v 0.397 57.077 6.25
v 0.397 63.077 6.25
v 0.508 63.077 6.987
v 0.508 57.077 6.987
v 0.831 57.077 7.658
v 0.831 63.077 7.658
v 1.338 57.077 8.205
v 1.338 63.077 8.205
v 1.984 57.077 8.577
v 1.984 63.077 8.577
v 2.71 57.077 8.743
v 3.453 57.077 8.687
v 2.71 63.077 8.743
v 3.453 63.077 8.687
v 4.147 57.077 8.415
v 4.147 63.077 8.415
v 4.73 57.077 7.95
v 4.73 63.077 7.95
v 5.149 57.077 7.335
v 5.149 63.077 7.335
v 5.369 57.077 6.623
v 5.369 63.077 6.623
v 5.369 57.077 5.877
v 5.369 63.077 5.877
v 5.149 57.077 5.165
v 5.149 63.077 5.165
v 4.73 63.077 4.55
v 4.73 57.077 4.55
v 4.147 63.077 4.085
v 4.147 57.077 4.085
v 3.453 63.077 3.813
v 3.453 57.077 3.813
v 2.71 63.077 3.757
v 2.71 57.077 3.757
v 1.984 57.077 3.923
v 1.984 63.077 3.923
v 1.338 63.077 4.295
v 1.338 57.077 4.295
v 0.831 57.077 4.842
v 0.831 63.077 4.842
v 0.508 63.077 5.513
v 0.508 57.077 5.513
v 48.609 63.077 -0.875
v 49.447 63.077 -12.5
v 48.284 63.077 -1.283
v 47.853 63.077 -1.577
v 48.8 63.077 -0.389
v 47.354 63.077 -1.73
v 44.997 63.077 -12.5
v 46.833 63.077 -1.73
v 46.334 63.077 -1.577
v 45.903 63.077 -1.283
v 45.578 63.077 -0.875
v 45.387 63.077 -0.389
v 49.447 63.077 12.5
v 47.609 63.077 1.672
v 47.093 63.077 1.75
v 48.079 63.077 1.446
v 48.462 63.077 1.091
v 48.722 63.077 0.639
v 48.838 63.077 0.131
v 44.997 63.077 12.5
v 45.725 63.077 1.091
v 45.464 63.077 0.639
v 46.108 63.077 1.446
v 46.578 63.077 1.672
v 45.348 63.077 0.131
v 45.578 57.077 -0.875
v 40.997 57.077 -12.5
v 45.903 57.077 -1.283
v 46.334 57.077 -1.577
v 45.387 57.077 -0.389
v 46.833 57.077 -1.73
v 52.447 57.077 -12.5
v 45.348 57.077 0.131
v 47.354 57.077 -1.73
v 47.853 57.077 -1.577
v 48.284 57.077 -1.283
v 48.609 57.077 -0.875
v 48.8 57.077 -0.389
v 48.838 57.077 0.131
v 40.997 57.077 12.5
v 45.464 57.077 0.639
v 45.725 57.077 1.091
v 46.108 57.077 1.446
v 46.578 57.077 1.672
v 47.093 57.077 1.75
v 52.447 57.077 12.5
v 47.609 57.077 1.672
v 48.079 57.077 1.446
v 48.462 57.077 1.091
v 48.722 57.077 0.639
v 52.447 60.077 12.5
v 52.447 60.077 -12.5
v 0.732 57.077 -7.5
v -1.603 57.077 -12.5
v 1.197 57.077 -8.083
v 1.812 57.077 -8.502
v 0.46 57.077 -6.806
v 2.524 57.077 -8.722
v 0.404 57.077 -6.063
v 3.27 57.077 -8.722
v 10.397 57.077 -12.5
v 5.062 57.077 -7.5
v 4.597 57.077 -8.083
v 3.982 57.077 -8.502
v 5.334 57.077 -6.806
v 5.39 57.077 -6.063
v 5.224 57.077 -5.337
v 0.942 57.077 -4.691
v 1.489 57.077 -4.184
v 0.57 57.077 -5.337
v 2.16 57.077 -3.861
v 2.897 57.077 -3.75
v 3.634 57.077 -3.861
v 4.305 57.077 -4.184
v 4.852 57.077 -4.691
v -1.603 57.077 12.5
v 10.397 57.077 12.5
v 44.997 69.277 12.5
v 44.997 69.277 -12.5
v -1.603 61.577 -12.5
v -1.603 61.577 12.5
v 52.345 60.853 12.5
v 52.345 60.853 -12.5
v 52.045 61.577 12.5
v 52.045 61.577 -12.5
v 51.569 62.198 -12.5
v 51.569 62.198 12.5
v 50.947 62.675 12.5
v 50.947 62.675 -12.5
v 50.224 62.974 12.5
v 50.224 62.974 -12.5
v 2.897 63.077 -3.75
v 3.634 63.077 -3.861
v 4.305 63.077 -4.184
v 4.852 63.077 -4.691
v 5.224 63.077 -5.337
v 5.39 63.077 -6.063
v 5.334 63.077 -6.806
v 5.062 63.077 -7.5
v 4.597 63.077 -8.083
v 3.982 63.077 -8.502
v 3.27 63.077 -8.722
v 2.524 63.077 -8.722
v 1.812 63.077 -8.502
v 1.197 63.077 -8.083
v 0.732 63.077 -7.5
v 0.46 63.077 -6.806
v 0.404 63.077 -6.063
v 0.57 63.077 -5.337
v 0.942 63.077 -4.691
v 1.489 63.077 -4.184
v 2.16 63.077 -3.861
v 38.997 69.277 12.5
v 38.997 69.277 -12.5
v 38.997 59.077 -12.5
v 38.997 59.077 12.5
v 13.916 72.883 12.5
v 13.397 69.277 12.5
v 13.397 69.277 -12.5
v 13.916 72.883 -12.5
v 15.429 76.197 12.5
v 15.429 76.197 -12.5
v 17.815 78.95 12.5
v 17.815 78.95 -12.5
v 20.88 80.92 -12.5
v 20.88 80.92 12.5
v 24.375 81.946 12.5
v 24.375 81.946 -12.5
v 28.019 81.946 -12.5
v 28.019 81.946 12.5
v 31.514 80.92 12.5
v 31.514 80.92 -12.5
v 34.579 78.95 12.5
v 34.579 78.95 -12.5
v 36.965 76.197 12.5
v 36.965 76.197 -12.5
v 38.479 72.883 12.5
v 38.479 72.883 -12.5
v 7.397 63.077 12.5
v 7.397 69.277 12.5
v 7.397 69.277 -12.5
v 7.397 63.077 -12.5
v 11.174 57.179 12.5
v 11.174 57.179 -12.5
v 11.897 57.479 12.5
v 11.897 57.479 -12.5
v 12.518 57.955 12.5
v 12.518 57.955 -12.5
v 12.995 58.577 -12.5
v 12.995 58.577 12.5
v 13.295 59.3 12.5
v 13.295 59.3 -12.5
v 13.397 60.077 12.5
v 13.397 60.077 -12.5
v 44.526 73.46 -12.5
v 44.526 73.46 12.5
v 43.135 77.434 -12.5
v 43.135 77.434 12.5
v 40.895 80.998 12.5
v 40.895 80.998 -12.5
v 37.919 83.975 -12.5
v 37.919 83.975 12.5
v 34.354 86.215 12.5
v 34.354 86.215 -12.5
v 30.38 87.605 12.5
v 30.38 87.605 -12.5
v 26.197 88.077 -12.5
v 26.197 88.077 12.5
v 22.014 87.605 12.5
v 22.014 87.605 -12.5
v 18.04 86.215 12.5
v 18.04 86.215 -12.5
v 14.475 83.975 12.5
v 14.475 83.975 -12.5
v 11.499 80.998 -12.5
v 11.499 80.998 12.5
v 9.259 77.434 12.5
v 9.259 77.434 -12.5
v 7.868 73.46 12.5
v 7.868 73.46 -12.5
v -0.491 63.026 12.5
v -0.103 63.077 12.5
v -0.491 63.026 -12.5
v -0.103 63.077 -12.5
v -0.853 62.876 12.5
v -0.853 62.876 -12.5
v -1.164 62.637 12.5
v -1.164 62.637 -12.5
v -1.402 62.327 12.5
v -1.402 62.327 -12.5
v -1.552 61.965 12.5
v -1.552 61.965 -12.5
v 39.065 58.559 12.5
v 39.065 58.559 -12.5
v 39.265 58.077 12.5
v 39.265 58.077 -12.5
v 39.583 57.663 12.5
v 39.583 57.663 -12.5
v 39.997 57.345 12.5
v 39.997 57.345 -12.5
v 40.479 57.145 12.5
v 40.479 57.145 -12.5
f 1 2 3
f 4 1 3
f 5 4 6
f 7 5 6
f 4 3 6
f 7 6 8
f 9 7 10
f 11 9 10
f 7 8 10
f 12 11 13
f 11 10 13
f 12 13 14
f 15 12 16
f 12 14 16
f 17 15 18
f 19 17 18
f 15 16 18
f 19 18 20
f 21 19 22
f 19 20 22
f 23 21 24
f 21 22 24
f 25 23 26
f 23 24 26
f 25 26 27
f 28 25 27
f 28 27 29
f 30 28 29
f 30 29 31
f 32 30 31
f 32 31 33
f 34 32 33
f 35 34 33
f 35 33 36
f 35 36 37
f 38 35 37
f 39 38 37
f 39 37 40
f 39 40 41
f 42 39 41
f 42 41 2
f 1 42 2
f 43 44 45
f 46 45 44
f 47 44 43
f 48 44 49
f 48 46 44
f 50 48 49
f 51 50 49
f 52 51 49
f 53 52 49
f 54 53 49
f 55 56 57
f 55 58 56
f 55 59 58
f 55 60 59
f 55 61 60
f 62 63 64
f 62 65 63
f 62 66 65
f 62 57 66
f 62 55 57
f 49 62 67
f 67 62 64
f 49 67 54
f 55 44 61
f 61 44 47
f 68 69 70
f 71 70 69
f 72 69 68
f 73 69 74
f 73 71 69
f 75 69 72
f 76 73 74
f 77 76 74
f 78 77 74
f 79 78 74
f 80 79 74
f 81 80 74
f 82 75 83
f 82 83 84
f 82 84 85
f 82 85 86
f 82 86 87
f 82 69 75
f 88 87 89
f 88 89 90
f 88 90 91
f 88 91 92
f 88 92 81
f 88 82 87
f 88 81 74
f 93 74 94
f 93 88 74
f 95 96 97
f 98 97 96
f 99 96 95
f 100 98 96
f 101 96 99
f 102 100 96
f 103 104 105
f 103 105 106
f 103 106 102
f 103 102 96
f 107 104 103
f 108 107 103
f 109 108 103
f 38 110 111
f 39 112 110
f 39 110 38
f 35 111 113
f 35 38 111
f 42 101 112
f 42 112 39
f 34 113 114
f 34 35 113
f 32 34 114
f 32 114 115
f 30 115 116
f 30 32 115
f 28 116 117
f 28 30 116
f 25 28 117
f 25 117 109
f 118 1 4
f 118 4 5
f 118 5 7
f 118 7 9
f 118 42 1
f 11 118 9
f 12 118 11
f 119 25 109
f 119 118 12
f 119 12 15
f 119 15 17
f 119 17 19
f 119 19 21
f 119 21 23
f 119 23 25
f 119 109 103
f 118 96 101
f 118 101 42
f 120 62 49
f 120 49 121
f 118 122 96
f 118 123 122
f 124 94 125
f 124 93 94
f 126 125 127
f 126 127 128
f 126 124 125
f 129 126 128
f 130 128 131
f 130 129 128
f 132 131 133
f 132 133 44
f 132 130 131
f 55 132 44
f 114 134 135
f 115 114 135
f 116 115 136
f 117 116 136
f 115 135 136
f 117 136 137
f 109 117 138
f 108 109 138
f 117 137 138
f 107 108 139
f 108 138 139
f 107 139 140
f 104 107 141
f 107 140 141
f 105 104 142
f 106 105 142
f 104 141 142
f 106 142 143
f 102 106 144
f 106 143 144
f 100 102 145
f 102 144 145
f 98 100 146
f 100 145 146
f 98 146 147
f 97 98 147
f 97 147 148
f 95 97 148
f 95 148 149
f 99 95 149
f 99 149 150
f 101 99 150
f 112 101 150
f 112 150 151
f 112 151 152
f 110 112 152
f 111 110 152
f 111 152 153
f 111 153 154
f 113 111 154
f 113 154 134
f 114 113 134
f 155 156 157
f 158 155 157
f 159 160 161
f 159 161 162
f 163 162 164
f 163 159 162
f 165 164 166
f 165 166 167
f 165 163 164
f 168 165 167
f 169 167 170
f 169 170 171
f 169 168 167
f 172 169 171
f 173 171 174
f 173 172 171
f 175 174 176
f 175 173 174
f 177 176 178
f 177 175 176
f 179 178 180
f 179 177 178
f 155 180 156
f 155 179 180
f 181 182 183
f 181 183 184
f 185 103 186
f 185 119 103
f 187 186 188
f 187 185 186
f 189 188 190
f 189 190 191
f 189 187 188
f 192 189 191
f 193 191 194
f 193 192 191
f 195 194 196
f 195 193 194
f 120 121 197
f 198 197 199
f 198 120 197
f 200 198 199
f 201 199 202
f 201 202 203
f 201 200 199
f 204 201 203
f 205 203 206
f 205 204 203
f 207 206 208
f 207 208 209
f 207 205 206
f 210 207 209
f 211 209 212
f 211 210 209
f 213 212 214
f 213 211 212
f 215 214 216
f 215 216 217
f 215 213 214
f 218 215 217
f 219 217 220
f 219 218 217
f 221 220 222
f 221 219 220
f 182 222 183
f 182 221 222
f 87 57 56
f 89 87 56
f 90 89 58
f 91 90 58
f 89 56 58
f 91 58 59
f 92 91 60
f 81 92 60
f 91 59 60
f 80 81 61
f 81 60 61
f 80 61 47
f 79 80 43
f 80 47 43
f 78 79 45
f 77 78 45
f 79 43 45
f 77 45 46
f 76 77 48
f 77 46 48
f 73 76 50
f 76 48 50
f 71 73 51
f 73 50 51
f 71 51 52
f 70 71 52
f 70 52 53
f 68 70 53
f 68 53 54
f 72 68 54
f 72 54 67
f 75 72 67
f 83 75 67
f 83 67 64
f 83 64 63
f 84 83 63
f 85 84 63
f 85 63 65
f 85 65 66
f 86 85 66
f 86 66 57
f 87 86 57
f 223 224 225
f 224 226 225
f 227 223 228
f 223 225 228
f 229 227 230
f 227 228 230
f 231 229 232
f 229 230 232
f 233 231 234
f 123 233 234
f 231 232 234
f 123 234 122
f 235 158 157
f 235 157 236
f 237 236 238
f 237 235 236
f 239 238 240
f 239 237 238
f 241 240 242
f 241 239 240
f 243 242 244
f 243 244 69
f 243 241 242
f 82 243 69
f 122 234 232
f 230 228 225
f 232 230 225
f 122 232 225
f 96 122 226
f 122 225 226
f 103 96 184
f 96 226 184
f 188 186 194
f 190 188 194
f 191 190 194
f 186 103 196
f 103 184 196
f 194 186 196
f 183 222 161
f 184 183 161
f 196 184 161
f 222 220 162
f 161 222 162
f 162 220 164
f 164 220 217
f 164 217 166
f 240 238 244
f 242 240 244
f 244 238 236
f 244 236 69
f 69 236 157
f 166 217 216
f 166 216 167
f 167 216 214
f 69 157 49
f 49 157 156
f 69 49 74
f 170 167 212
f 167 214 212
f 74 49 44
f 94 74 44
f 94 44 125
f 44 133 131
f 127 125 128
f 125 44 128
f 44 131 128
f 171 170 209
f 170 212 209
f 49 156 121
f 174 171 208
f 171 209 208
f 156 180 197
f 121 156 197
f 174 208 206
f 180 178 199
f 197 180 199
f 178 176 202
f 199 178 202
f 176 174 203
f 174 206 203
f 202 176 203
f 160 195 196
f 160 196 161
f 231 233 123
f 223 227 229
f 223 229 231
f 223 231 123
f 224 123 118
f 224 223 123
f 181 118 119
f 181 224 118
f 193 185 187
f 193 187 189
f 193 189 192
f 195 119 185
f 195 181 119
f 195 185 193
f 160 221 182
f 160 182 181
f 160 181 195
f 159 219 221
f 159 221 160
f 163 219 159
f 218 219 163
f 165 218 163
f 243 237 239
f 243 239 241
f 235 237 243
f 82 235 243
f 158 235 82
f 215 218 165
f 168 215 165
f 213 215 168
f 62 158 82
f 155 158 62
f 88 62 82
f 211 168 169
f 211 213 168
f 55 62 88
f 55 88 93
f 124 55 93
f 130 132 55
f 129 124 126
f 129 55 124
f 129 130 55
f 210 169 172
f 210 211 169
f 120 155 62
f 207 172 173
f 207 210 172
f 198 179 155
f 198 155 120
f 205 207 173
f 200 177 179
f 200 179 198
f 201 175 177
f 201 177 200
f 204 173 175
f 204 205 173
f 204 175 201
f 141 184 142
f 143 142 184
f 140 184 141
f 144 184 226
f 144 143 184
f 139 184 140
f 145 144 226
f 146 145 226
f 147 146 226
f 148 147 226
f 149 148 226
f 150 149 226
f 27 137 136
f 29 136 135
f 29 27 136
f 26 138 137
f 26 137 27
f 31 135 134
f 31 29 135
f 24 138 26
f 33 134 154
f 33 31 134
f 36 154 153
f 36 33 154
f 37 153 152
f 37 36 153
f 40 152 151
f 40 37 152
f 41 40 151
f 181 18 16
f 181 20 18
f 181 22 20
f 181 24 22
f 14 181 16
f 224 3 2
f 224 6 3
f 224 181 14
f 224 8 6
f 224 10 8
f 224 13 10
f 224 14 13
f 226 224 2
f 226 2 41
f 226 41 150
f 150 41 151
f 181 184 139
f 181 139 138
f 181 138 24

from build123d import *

# Parameters (mm, degrees)
BOSS_EXTRU_1_DEPTH      = 12.5
ESQUISSE2_R             = 2.5
ESQUISSE2_R_2           = 1.75
ENL_V_MAT_EXTRU_1_DEPTH = 10
CONG_4_R                = 3
CONG_5_R                = 1.5


with BuildPart() as part:
    # Esquisse1 → Boss.-Extru.1 (new, symmetric)
    with BuildSketch(Plane.XY):
        with BuildLine():
            Line((0.397051683, 57.076719782), (10.397051683, 57.076719782))
            ThreePointArc((10.397051683, 57.076719782), (12.518372027, 57.955399438), (13.397051683, 60.076719782))
            Line((13.397051683, 60.076719782), (13.397051683, 69.276719782))
            ThreePointArc((13.397051683, 69.276719782), (26.197051683, 82.076719782), (38.997051683, 69.276719782))
            Line((38.997051683, 69.276719782), (38.997051683, 59.076719782))
            ThreePointArc((38.997051683, 59.076719782), (39.582838121, 57.662506219), (40.997051683, 57.076719782))
            Line((40.997051683, 57.076719782), (49.420552909, 57.076719782))
            Line((49.420552909, 57.076719782), (52.447260314, 57.076719782))
            Line((52.447260314, 57.076719782), (52.447260314, 63.076719782))
            Line((52.447260314, 63.076719782), (49.420552909, 63.076719782))
            Line((49.420552909, 63.076719782), (44.997051683, 63.076719782))
            Line((44.997051683, 63.076719782), (44.997051683, 69.276719782))
            ThreePointArc((44.997051683, 69.276719782), (26.197051683, 88.076719782), (7.397051683, 69.276719782))
            Line((7.397051683, 69.276719782), (7.397051683, 63.076719782))
            Line((7.397051683, 63.076719782), (0.397051683, 63.076719782))
            Line((0.397051683, 63.076719782), (-1.602948317, 63.076719782))
            Line((-1.602948317, 63.076719782), (-1.602948317, 57.076719782))
            Line((-1.602948317, 57.076719782), (0.397051683, 57.076719782))
        make_face()
    extrude(amount=BOSS_EXTRU_1_DEPTH, both=True)

    # Esquisse2 → Enlèv. mat.-Extru.1 (cut)
    with BuildSketch(Plane(origin=(0, 63.076719782, 0), x_dir=(1, 0, 0), z_dir=(0, 1, 0))):
        with Locations(Location((2.897051683, 6.25, 0), (0, 0, 270))):
            Circle(ESQUISSE2_R)
        with Locations(Location((2.897051683, -6.25, 0), (0, 0, 180))):
            Circle(ESQUISSE2_R)
        with Locations(Location((47.0933932, 0, 0), (0, 0, 270))):
            Circle(ESQUISSE2_R_2)
    extrude(amount=-ENL_V_MAT_EXTRU_1_DEPTH, mode=Mode.SUBTRACT)

    # Congé4
    cong_4_edges = [part.edges().sort_by_distance(p)[0] for p in [
        (52.447260314, 63.076719782, 0),
    ]]
    fillet(cong_4_edges, radius=CONG_4_R)

    # Congé5
    cong_5_edges = [part.edges().sort_by_distance(p)[0] for p in [
        (-1.602948317, 63.076719782, 0),
    ]]
    fillet(cong_5_edges, radius=CONG_5_R)


solid = part.part
